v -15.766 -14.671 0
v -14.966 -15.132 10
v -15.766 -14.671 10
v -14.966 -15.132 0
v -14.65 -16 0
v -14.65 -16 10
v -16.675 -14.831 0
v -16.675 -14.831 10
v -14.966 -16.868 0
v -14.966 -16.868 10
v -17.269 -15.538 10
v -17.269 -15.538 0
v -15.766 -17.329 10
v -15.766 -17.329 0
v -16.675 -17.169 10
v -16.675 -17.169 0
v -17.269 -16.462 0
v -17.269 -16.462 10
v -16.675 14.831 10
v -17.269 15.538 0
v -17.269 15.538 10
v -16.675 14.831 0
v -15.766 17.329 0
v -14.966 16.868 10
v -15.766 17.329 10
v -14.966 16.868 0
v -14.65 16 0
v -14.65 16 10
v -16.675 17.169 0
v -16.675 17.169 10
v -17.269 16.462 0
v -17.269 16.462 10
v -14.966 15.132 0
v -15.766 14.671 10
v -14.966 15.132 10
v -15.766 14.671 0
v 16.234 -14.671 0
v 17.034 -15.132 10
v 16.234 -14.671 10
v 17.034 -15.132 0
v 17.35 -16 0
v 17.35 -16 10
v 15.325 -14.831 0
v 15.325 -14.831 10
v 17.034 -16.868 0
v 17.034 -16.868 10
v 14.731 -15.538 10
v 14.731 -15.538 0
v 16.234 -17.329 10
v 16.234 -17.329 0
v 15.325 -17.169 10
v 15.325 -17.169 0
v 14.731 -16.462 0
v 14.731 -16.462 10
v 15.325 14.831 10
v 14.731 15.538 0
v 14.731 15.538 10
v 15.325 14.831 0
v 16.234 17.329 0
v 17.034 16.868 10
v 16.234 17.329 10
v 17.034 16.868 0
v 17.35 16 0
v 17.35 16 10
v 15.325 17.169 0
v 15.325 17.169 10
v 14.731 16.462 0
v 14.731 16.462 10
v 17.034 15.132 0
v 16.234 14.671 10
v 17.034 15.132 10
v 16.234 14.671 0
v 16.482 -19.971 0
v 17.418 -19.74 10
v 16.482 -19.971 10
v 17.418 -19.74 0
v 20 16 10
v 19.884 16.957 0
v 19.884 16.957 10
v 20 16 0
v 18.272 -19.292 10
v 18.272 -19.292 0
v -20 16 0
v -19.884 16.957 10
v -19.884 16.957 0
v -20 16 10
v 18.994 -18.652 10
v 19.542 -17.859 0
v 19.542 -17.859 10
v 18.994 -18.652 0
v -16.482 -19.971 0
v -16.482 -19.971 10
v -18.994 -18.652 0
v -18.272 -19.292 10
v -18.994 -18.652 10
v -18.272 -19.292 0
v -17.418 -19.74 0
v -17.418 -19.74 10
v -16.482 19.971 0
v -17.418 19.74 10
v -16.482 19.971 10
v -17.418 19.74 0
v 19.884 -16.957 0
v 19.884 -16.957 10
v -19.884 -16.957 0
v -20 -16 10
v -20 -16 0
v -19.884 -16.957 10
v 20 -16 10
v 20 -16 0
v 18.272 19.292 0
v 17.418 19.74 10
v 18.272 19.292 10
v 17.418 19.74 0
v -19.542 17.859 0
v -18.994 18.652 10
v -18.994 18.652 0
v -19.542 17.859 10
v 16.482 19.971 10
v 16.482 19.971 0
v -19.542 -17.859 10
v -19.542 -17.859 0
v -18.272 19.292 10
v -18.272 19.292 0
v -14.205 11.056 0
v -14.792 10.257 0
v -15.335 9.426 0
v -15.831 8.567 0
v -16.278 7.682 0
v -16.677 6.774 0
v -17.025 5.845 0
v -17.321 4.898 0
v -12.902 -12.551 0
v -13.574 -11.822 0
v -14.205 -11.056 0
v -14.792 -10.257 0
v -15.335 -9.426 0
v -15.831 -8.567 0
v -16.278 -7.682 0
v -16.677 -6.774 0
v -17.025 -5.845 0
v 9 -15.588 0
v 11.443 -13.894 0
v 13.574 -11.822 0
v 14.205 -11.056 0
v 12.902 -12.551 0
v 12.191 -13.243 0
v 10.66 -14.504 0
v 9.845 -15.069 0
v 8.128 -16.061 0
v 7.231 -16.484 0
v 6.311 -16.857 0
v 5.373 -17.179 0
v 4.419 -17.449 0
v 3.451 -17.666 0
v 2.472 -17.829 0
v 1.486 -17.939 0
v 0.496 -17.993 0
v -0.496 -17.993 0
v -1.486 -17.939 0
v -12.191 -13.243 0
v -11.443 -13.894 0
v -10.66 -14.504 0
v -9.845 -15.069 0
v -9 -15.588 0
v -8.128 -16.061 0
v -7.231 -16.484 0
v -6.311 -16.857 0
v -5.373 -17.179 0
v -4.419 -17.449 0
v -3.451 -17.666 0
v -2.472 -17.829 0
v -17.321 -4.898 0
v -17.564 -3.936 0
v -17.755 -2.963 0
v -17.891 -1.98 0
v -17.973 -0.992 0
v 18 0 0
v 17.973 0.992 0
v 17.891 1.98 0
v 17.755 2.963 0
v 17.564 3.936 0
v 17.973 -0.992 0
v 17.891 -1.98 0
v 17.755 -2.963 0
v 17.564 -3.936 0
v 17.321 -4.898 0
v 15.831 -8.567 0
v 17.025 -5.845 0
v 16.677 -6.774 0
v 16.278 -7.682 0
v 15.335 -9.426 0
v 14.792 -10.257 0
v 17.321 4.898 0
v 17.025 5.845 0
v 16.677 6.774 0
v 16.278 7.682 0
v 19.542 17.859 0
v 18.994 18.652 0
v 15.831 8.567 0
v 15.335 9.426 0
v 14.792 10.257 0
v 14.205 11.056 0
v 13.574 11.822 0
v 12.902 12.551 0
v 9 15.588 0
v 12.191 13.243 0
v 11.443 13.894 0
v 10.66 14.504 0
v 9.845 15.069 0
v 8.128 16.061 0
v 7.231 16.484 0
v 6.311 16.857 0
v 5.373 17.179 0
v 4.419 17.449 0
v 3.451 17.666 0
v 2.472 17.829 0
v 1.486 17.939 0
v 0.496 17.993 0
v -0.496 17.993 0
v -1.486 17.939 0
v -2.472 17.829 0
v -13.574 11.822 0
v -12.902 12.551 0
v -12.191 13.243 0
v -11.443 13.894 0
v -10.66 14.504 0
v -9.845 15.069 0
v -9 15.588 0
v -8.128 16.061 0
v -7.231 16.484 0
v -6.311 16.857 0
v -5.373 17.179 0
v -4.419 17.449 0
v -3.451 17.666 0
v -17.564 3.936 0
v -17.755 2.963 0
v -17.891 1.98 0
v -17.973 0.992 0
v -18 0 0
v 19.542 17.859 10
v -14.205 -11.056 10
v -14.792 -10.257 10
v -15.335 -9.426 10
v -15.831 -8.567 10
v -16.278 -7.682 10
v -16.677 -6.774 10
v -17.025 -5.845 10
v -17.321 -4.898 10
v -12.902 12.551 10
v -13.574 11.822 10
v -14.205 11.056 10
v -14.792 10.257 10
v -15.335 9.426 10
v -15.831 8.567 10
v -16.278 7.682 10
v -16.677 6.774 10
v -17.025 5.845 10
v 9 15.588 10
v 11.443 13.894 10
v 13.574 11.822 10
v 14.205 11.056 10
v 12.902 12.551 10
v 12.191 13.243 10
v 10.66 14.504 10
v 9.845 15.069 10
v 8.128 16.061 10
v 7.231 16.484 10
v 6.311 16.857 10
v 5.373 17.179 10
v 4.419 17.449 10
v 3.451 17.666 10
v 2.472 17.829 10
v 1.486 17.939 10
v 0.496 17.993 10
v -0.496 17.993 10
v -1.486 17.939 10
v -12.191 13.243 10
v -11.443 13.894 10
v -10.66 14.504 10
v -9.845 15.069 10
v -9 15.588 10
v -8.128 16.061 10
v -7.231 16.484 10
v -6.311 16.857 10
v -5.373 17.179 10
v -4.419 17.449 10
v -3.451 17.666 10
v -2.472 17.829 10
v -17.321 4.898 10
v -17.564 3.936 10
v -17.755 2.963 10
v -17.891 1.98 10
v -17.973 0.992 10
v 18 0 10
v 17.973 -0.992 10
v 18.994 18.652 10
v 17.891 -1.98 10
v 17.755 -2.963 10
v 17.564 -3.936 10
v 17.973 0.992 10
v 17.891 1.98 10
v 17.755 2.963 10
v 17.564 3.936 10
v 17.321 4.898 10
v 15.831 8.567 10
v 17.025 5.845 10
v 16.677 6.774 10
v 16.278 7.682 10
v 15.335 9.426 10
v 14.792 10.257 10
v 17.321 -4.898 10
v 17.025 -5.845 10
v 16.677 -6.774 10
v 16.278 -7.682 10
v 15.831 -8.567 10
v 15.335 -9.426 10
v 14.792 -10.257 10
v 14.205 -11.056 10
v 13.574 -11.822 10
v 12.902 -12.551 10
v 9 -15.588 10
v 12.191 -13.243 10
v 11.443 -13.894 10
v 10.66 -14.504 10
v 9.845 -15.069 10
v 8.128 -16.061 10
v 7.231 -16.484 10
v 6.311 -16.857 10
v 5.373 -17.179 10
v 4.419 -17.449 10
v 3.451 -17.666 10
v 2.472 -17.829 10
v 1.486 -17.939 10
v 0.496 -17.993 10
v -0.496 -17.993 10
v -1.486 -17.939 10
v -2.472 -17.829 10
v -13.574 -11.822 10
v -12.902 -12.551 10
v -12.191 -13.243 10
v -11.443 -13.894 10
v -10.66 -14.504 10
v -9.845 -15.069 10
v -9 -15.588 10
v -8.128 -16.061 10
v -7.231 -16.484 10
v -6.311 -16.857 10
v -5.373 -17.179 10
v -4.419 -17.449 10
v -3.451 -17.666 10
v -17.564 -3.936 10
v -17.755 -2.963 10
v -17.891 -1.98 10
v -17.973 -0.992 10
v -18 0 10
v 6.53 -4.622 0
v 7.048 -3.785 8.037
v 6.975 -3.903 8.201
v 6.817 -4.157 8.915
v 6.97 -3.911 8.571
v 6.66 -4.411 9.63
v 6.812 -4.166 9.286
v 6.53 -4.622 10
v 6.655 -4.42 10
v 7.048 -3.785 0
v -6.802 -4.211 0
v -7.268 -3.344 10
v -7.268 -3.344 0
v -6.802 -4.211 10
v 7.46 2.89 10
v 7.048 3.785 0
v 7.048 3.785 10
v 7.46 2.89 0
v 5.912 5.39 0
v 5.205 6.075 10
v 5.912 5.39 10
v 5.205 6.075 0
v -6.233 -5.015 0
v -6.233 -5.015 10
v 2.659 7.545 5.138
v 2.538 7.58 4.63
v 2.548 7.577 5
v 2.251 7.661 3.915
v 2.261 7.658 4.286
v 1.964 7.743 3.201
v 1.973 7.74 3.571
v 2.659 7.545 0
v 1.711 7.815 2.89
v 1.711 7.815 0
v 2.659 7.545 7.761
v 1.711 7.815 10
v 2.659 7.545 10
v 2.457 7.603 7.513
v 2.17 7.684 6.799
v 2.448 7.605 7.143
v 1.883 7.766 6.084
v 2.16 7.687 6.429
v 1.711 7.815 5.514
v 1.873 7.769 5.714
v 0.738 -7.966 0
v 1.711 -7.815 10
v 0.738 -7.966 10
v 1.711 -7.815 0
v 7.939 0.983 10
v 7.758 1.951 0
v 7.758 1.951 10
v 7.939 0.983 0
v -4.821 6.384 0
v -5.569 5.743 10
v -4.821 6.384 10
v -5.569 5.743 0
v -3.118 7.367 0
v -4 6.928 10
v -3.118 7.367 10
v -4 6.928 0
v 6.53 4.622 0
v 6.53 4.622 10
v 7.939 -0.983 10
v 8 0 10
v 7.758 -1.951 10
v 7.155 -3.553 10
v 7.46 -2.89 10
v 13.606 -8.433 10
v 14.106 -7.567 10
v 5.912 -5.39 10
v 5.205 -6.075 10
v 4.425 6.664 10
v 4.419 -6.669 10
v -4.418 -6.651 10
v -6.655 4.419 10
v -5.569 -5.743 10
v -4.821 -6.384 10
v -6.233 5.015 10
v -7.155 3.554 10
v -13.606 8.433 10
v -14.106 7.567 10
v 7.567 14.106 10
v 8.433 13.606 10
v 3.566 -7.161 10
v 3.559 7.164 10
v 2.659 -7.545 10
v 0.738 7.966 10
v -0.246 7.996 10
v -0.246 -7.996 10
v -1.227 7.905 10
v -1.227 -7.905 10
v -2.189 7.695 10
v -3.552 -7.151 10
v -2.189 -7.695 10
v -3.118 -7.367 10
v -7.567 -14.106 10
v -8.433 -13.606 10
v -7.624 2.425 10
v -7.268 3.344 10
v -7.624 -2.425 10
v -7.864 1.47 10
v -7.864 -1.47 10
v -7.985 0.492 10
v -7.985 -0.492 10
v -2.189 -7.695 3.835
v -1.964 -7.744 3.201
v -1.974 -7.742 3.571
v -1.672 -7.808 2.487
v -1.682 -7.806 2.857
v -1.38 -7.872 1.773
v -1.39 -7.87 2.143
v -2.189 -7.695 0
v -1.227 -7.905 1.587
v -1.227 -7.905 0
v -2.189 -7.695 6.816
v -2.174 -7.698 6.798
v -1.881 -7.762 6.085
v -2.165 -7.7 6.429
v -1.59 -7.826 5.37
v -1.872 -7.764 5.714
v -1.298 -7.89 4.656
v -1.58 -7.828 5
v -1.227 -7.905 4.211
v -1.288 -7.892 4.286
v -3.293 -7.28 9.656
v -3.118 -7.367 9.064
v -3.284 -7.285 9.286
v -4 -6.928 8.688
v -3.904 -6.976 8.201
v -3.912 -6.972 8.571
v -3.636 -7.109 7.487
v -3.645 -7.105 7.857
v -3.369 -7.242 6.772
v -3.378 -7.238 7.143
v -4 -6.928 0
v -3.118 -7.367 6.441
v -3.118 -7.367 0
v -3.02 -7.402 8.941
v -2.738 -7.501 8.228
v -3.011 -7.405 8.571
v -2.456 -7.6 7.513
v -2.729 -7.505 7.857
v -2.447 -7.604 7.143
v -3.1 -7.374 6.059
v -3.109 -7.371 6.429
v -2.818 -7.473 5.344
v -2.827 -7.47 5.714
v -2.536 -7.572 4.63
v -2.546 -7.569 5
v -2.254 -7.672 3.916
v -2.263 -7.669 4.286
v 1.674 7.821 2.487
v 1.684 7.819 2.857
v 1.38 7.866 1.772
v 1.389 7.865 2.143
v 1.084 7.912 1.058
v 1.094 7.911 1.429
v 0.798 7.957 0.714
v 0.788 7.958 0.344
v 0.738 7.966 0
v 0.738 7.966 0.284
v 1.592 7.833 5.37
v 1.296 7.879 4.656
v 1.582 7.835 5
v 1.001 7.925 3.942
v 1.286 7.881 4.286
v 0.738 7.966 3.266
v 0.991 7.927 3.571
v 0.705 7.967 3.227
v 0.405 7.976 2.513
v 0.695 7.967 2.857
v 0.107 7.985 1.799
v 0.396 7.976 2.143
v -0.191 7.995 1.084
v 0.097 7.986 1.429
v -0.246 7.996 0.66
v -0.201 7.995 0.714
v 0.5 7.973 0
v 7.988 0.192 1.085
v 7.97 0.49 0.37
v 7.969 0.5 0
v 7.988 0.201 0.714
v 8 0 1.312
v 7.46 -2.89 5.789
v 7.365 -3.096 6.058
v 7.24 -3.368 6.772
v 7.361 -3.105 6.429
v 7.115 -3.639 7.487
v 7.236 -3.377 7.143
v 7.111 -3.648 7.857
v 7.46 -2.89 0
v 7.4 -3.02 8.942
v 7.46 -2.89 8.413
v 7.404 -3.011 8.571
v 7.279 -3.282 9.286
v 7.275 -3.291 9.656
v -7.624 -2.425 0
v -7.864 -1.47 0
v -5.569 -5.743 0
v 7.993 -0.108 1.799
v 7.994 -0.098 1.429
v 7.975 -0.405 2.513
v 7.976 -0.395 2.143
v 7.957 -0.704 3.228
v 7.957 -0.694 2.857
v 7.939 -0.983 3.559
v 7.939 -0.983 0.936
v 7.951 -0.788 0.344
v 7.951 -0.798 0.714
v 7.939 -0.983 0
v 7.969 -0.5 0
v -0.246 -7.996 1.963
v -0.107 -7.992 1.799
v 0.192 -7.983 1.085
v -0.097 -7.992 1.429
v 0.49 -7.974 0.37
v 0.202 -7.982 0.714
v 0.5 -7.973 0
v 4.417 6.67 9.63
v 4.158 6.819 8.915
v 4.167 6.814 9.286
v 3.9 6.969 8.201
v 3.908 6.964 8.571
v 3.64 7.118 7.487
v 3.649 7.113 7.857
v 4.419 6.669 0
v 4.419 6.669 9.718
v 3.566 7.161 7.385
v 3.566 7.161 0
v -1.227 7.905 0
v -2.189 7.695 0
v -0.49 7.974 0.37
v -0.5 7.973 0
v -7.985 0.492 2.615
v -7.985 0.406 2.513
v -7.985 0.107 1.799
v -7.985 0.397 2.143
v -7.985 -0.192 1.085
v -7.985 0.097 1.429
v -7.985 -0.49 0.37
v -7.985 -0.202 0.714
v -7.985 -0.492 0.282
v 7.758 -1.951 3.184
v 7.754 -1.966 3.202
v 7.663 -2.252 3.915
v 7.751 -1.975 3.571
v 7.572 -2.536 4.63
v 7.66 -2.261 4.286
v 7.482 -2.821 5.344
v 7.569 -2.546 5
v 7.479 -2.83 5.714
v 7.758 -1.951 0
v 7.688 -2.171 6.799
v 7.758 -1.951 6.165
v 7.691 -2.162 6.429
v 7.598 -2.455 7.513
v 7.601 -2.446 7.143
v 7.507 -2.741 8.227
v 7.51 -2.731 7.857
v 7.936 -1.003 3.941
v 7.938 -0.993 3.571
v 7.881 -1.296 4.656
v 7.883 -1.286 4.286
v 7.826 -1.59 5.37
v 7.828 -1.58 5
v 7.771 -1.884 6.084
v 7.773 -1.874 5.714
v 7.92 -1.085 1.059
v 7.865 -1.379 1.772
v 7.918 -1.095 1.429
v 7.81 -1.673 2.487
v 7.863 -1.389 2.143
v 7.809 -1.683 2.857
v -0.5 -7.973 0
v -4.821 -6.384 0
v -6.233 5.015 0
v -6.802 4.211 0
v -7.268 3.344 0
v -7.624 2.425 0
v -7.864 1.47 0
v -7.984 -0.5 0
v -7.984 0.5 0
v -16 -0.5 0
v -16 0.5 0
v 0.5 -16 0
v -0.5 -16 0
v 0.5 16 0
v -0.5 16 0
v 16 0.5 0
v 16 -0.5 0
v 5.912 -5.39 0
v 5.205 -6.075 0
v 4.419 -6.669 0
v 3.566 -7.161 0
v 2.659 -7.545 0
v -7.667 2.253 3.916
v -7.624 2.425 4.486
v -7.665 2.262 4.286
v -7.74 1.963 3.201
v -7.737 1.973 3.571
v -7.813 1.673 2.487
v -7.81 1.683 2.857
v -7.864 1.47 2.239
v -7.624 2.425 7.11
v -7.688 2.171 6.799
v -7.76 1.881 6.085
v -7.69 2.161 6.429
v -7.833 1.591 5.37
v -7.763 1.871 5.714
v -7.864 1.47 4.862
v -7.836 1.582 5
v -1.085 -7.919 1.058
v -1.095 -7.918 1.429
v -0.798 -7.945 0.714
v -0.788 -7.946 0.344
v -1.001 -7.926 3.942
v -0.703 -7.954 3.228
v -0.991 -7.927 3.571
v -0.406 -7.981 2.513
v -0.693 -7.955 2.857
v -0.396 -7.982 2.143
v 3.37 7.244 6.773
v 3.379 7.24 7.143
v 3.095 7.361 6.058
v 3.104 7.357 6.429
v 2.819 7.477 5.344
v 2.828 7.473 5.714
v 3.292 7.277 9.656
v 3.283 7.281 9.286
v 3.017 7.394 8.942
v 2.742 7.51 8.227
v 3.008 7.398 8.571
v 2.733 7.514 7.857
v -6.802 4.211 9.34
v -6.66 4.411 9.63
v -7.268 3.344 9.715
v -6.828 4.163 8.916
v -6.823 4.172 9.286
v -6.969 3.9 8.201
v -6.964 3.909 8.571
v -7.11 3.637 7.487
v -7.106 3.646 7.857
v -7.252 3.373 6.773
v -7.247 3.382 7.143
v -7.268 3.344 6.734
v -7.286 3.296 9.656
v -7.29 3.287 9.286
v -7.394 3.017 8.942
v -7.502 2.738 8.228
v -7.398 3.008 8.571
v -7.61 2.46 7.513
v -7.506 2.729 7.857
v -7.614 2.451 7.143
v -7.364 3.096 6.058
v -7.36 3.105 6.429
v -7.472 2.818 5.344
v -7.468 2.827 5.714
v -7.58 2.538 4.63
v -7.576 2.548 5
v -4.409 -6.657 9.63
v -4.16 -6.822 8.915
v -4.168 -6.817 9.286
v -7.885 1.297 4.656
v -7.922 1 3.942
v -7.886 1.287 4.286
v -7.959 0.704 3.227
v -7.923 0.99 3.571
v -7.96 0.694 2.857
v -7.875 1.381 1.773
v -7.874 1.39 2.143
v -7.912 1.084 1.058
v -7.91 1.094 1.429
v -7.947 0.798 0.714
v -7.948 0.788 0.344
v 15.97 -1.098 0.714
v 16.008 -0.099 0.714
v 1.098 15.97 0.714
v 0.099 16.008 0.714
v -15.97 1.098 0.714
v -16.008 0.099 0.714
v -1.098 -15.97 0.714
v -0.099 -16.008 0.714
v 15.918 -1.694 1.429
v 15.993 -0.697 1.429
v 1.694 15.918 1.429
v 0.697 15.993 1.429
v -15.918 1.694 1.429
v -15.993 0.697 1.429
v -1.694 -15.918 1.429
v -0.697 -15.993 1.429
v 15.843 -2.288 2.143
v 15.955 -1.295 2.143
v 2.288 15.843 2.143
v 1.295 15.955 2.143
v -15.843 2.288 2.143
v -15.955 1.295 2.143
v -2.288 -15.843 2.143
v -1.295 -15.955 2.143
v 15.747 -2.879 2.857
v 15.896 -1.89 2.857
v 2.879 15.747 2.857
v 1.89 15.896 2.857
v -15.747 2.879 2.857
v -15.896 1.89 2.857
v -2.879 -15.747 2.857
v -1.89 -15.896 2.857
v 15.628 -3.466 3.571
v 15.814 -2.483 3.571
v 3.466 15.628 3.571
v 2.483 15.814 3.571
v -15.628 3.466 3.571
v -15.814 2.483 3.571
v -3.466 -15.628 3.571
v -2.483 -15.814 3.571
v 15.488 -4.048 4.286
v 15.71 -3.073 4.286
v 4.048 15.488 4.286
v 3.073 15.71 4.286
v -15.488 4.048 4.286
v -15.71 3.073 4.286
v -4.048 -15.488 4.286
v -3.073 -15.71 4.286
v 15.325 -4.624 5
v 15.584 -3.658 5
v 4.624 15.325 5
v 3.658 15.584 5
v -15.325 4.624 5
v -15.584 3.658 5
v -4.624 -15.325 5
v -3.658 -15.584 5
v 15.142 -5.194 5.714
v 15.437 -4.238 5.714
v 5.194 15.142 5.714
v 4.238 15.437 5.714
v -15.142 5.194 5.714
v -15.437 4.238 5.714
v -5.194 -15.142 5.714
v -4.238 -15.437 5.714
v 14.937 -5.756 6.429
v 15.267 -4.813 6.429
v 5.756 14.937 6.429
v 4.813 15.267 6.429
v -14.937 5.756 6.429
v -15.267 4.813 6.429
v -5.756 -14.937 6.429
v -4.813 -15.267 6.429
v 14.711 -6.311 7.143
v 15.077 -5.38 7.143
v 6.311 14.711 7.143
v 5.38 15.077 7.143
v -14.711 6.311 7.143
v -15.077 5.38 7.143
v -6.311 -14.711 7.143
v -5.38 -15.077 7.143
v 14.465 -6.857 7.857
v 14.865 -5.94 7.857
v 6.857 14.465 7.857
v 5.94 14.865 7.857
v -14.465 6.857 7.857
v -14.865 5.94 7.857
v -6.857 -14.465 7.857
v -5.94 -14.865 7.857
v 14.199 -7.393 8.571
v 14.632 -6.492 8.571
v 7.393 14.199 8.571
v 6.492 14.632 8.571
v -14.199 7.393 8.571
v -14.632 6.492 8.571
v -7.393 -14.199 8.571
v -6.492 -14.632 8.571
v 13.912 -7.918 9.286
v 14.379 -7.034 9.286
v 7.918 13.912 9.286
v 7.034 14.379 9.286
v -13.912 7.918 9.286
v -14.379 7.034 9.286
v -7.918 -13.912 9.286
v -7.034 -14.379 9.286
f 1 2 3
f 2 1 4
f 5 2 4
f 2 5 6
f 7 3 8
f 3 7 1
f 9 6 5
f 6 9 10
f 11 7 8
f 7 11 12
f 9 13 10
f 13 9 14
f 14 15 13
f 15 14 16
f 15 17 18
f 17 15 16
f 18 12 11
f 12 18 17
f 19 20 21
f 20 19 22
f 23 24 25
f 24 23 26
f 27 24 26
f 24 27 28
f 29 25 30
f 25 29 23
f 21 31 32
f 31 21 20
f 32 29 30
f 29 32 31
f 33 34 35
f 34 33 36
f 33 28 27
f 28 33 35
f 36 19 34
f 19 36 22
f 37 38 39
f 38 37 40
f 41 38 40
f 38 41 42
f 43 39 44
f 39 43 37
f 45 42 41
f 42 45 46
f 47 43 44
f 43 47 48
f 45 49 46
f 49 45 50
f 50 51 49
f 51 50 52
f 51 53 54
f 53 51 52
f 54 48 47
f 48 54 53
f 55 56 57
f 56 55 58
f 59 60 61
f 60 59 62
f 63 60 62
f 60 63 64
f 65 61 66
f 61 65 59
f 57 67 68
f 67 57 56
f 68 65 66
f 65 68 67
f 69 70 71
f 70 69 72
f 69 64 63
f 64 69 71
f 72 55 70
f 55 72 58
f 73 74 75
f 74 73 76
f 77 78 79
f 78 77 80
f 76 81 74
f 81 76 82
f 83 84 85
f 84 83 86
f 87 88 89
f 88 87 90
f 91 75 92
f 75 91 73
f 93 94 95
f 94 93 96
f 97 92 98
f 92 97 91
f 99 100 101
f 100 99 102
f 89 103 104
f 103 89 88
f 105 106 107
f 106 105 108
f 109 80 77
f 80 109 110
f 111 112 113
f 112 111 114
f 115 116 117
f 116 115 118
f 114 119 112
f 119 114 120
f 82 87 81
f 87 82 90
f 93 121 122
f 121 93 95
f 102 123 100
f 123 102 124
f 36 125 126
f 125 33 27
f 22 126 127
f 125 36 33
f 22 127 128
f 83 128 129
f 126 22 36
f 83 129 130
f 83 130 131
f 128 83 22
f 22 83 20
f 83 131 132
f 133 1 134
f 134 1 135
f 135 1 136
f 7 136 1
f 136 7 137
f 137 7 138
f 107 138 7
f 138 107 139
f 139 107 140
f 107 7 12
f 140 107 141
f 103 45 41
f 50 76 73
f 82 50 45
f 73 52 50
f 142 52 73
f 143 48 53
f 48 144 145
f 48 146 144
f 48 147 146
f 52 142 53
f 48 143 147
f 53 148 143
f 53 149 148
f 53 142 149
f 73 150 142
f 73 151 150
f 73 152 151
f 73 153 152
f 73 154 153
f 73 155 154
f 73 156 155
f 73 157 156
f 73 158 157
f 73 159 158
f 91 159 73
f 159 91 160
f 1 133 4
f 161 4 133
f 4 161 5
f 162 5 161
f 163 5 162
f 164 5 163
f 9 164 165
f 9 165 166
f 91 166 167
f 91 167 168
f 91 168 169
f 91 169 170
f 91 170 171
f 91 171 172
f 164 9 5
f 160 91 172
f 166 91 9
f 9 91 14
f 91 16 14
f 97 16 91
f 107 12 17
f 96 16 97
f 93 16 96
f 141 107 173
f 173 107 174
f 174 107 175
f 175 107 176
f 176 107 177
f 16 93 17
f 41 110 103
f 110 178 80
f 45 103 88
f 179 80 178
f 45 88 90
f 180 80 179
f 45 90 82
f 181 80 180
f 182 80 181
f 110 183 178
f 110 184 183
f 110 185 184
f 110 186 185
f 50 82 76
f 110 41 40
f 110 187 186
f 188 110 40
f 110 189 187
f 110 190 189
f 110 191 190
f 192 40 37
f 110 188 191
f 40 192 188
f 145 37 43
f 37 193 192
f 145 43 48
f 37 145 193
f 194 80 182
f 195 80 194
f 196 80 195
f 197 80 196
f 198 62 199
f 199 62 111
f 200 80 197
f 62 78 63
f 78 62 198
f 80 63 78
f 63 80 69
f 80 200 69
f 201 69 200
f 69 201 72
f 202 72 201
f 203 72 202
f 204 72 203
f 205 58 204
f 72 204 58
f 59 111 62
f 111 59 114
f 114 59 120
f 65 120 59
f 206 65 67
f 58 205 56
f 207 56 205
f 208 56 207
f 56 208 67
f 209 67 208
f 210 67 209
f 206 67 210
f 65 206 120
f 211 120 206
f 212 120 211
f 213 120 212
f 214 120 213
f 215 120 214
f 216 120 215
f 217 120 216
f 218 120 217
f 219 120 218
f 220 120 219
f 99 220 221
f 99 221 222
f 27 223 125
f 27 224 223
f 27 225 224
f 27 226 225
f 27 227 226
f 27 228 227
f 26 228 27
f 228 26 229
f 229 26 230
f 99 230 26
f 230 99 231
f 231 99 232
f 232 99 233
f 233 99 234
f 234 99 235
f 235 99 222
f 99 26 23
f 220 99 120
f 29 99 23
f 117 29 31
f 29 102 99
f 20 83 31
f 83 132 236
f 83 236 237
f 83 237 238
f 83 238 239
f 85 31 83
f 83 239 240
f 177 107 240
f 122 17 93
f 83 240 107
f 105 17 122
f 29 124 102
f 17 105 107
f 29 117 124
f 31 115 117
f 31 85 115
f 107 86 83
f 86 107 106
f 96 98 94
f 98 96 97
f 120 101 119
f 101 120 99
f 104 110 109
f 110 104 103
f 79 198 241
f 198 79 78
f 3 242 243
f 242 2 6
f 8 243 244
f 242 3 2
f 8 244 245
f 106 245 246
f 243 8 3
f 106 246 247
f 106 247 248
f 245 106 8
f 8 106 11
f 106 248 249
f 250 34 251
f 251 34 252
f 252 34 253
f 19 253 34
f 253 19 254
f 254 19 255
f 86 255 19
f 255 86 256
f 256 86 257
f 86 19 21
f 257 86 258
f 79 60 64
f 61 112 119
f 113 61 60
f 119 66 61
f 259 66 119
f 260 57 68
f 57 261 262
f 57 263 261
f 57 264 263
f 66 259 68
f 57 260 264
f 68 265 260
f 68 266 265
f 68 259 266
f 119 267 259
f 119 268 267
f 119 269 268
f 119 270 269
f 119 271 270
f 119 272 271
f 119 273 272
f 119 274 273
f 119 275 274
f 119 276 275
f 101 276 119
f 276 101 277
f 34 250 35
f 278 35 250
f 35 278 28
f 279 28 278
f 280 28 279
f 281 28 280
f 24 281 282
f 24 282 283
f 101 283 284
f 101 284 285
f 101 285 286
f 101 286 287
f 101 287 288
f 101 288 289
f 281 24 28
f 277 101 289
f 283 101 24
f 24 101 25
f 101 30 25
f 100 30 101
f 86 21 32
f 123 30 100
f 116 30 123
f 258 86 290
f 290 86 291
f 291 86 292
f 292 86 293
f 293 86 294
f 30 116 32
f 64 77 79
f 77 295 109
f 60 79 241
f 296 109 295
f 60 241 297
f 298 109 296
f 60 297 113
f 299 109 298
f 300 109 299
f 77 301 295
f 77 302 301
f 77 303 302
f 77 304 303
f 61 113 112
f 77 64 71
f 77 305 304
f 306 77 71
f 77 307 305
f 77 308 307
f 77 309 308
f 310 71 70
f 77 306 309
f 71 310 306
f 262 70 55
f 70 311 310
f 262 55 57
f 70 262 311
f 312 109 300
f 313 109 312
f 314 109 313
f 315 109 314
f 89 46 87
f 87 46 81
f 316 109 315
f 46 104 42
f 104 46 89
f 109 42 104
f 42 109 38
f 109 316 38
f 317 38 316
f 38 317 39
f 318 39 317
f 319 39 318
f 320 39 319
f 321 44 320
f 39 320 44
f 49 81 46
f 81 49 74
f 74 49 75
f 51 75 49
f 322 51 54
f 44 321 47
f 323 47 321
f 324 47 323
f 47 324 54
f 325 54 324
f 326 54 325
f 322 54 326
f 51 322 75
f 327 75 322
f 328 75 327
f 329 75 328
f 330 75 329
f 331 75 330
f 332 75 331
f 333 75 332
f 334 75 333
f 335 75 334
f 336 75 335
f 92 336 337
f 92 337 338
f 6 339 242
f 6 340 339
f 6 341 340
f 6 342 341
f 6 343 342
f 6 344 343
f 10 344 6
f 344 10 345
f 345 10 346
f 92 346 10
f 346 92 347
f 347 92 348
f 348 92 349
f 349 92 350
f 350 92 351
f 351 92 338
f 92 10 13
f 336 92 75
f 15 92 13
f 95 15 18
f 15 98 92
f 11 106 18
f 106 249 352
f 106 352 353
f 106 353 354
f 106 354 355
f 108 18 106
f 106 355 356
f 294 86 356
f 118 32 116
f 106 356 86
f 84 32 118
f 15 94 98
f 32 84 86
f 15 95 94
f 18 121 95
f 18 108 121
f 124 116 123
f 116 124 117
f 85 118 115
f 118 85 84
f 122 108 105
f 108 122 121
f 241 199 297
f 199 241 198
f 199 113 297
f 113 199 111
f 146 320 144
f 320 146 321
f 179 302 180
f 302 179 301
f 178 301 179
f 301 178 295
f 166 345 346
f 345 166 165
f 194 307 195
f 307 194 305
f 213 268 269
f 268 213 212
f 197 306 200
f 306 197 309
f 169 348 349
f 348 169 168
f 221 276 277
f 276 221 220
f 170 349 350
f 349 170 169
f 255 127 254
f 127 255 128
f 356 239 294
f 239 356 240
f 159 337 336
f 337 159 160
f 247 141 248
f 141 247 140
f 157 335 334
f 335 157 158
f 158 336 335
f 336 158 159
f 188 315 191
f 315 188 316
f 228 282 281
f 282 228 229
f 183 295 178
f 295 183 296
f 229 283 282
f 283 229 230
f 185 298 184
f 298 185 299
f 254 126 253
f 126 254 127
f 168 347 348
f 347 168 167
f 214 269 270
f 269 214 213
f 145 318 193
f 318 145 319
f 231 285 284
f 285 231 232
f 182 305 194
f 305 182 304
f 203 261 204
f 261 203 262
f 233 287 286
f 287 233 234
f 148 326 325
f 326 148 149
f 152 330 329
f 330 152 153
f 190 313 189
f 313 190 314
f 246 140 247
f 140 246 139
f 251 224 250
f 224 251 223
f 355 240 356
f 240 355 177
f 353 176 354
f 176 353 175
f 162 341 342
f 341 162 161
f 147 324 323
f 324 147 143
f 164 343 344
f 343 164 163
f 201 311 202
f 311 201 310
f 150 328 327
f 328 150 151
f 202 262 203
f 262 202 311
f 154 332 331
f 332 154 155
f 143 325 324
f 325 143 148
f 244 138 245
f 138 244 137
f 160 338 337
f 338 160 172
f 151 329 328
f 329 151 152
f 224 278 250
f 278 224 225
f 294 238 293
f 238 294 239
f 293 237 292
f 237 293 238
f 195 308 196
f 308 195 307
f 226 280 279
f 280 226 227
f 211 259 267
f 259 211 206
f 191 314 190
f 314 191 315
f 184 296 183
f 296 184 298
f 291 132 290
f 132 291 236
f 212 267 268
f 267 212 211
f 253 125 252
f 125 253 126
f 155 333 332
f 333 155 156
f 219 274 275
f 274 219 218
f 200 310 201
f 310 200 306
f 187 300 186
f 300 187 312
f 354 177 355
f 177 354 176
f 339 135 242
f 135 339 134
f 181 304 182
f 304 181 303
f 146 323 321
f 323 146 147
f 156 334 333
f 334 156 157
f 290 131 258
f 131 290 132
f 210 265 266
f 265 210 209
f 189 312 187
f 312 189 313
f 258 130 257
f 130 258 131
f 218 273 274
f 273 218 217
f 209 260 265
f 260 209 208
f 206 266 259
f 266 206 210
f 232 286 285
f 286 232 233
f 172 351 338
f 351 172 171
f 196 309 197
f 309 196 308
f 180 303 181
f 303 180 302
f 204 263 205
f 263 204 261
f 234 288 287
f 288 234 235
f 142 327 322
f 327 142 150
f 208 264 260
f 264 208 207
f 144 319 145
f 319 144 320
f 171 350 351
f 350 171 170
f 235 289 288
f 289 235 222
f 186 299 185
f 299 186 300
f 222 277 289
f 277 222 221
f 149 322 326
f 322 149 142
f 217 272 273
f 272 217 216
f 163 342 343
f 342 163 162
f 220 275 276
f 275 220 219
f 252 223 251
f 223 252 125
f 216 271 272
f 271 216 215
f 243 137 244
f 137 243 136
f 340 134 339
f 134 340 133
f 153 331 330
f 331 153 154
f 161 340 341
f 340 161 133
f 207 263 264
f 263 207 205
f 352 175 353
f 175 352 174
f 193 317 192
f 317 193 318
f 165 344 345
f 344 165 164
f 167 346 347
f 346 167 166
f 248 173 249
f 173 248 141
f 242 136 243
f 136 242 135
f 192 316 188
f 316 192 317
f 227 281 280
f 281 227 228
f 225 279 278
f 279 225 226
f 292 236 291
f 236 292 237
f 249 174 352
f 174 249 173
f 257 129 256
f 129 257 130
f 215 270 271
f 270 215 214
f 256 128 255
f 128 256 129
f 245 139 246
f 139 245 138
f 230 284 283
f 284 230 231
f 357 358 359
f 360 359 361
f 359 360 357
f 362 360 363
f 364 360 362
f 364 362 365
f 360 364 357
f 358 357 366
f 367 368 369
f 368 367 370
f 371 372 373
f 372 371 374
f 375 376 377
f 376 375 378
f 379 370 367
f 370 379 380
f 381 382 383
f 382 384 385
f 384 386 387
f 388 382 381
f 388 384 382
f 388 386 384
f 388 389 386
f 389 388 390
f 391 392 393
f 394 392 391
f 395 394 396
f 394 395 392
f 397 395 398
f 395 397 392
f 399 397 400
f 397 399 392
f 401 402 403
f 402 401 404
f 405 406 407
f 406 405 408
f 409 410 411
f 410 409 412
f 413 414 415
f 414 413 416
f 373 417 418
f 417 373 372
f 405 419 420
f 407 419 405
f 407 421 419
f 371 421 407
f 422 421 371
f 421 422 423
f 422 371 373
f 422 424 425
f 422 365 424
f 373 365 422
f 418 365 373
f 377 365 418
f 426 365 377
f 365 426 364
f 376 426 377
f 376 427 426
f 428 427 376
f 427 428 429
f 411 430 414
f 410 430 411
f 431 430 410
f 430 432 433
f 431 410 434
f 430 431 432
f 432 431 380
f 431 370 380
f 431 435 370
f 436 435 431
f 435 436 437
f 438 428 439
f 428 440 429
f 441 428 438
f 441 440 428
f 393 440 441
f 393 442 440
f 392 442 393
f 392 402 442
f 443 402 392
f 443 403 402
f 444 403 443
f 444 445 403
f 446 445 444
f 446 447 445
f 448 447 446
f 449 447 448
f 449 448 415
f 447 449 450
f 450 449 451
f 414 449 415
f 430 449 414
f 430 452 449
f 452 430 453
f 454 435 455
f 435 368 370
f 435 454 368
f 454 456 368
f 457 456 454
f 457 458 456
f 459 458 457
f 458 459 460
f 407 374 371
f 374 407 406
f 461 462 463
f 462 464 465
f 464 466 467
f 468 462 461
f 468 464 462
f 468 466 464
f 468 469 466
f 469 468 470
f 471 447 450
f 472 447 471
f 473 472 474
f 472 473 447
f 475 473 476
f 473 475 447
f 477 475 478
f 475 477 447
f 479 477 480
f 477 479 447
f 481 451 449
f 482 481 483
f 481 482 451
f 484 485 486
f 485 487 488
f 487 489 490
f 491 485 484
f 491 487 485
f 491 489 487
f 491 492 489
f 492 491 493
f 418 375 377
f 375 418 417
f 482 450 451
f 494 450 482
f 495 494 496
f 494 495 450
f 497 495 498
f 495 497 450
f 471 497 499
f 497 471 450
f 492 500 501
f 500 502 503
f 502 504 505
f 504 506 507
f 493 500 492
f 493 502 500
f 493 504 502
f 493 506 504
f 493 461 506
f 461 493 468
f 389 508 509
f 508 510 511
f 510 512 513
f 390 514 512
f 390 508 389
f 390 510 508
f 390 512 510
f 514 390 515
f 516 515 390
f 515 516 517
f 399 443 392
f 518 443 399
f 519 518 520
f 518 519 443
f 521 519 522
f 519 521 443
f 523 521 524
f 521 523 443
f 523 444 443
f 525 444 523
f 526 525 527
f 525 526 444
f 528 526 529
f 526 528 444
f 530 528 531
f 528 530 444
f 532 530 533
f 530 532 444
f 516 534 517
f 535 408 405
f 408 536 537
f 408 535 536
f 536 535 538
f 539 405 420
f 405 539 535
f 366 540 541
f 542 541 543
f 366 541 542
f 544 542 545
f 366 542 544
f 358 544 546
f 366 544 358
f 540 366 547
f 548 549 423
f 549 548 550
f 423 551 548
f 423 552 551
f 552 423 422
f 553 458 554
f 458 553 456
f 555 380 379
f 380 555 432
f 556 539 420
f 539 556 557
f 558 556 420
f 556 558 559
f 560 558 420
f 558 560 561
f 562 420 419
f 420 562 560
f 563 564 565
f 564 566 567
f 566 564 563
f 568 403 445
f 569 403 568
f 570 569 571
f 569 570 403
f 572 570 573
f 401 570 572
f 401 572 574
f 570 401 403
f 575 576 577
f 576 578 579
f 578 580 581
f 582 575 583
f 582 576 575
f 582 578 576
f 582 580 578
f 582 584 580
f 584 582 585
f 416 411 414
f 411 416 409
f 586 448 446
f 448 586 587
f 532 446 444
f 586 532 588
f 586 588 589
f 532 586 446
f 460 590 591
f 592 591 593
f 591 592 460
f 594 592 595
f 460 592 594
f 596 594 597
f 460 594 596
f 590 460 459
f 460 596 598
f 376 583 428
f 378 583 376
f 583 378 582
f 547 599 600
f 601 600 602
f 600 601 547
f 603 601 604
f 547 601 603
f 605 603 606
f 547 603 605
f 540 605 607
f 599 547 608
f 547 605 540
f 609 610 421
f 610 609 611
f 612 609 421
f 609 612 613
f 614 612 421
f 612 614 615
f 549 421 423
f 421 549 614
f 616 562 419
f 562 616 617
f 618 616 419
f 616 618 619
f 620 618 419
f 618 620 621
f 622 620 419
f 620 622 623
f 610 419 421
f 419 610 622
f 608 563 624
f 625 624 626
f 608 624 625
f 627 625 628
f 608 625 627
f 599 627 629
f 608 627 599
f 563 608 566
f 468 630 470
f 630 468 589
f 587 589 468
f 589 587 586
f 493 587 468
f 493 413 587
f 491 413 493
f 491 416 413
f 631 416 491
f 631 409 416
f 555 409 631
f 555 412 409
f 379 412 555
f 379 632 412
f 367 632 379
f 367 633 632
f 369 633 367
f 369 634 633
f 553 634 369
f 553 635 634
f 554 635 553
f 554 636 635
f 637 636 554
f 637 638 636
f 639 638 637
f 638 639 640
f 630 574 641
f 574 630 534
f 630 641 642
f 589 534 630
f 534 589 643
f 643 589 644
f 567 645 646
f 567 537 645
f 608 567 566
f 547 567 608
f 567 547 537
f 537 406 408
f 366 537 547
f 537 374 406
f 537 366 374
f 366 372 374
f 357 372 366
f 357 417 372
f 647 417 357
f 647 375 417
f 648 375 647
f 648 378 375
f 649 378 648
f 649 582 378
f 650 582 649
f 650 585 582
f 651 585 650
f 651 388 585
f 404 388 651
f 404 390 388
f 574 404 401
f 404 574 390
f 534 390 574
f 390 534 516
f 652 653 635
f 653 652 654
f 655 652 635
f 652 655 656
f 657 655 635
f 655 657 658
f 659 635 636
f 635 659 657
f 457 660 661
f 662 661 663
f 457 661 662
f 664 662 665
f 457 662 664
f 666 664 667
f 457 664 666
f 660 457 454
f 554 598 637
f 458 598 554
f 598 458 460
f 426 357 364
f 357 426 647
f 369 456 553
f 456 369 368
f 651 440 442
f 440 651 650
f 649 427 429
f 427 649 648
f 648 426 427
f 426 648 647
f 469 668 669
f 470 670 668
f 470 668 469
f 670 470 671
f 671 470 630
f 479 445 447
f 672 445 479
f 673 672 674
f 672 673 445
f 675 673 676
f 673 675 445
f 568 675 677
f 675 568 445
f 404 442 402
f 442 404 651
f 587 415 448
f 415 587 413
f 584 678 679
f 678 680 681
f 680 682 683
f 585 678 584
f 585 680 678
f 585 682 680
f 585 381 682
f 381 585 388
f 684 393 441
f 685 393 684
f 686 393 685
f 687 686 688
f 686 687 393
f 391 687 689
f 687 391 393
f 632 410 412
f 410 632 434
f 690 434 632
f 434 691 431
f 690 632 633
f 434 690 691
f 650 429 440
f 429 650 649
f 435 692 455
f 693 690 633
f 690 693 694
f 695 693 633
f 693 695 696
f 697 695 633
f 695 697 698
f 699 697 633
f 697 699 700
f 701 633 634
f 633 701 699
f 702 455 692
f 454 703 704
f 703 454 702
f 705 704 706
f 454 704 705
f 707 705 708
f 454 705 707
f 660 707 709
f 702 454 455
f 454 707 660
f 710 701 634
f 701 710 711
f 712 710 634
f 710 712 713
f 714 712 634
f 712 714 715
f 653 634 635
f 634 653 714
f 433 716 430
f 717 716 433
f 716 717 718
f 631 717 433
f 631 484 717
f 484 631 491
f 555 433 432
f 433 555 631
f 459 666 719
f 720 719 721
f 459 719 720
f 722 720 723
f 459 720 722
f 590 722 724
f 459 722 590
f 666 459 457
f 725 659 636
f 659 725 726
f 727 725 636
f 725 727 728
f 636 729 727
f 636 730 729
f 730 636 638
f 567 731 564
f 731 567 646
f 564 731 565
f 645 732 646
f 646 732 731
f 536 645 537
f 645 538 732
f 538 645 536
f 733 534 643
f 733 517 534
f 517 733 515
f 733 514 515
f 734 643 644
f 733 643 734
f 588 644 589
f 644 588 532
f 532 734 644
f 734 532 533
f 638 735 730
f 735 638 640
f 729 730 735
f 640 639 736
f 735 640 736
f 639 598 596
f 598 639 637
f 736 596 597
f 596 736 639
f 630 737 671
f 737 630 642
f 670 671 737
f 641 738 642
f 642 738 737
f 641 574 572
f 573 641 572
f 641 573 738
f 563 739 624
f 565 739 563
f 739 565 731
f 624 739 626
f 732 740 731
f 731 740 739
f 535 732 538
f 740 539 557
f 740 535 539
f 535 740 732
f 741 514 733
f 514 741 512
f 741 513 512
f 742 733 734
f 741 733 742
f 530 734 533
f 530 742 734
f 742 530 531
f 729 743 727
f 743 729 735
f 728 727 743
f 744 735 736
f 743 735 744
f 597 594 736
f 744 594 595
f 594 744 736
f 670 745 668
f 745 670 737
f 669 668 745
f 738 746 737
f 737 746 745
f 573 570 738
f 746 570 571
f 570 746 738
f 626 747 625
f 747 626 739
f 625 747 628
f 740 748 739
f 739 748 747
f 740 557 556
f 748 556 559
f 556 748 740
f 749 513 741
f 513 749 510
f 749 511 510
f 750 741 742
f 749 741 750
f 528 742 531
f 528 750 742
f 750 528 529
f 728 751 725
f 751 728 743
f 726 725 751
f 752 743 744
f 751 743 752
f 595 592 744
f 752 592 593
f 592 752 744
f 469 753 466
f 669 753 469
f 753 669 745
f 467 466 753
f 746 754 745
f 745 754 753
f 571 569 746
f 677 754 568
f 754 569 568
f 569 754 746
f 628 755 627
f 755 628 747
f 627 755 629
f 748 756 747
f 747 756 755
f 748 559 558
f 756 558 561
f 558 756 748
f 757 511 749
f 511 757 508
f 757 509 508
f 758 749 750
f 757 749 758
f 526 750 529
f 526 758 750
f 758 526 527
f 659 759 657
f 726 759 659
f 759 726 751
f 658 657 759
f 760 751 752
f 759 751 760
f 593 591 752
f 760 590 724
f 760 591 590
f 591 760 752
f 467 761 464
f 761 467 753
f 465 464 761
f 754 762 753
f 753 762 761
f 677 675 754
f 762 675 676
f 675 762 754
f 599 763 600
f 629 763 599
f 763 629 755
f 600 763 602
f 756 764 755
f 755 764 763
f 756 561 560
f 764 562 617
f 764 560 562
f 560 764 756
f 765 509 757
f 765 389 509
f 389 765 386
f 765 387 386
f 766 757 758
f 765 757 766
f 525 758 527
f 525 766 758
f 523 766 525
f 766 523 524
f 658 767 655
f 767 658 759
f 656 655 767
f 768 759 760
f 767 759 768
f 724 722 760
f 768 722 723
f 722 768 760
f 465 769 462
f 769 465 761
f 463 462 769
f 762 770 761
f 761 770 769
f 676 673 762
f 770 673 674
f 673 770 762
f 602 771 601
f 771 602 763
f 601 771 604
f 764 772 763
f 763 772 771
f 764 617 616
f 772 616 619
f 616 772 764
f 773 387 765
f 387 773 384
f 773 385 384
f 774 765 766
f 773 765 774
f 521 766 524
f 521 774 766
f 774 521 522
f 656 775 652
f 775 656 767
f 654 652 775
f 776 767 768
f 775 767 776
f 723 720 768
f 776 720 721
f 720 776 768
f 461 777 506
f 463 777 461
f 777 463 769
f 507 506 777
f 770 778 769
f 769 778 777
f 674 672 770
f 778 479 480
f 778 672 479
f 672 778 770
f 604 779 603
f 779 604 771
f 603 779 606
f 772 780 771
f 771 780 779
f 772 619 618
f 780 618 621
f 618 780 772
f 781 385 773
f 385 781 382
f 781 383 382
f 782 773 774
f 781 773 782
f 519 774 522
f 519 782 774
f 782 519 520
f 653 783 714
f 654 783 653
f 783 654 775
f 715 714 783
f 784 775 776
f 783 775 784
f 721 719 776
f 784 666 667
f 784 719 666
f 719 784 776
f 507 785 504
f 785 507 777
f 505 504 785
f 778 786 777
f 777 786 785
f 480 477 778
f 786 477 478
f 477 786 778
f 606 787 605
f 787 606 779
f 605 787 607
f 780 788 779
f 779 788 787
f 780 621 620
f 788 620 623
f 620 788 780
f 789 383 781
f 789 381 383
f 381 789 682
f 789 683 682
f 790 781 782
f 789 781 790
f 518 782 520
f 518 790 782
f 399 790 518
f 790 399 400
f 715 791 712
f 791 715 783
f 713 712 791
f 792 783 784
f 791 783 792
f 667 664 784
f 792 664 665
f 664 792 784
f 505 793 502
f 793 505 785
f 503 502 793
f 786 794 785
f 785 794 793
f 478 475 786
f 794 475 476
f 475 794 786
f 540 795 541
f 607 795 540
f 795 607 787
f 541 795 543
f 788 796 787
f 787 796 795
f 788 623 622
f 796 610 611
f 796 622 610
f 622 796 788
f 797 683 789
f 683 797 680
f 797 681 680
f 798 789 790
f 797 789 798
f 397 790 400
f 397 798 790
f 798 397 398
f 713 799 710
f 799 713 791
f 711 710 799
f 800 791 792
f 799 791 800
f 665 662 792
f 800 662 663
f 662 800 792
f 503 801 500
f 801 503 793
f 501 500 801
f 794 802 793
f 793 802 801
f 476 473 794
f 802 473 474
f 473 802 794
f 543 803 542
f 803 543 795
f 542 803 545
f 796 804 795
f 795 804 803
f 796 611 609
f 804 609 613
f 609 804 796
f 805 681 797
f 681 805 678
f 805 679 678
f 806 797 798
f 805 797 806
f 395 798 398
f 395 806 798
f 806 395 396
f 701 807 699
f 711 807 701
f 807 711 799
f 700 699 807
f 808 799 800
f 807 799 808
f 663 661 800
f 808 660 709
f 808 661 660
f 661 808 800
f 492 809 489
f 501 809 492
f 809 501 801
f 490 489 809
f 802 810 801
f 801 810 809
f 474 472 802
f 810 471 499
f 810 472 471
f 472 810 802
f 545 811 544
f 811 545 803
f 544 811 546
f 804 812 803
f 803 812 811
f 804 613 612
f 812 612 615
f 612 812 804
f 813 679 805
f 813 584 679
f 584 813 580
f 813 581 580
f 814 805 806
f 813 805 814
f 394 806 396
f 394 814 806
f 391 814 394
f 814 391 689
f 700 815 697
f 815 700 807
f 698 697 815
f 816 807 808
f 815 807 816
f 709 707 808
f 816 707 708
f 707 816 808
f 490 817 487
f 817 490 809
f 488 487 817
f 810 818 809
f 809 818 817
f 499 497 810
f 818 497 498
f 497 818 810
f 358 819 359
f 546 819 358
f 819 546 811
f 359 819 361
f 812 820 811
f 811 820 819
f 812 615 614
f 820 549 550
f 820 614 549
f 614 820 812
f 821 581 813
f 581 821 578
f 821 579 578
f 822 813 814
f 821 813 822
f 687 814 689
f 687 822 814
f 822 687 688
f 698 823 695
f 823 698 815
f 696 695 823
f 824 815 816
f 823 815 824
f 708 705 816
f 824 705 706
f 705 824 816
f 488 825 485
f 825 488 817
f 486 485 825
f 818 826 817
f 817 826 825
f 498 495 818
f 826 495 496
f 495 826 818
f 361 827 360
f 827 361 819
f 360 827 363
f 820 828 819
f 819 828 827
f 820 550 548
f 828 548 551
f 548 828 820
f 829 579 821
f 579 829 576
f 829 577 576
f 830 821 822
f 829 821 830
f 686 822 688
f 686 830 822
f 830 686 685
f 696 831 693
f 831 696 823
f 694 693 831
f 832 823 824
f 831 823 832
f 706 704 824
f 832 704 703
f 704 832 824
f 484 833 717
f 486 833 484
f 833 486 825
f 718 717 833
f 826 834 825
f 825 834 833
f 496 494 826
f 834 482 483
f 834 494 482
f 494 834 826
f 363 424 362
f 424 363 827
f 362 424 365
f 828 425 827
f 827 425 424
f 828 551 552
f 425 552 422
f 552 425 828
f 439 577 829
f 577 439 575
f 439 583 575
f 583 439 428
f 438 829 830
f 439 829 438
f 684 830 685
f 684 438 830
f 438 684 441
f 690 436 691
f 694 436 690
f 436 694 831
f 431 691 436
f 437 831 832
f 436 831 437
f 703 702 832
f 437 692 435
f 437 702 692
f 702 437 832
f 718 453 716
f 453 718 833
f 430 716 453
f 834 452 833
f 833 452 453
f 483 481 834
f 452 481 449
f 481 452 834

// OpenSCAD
// file: ../config.scad
/*
 * config
 *
 * Copyright 2013 <b@Zi.iS>
 * License CC BY 3.0
 */

$fa = 1;
$fs = 1;
preview = 1;

// preview colors
color_steal = [.8,.8,.8];
color_wood = [.3,.3,0];
color_print = [0,.8,0];

// metric bolt sizes
function m_hole(size) = size*1.1/2;
function m_pilot(size) = size*.9/2;

mounting_bolt = 3;

// slightly move and slightly elongate objects in preview to overcome scad rounding errors
module e() {
	if(preview==1) {
		translate([
			0,
			0,
			-.1
		]) {
			scale([
				1,
				1,
				1.1
			]) {
				child();
			}
		}
	} else {
		child();
	}
}

module m_washer(
	size = 3
) {
	color(color_steal) {
		difference() {
			cylinder(
				r = size/2*2,
				h = size*.2
			);
			e() cylinder(
				r = size/2,
				h = size*.2
			);
		}
	}
	translate([
		0,
		0,
		size*.2
	]) {
		child();
	}
}

module m_nut(
	size = 3
) {
	color(color_steal) {
		difference() {
			cylinder(
				r = size*1.8/2,
				h = size*.8,
				$fn = 6
			);
		}
	}
	translate([
		0,
		0,
		size*.8
	]) {
		child();
	}
}

module m_nylock(
	size = 3
) {
	color(color_steal) {
		difference() {
			cylinder(
				r = size*1.8/2,
				h = size,
				$fn = 6
			);
		}
	}
	translate([
		0,
		0,
		size
	]) {
		child();
	}
}

module screw(
	r = 1,
	h = 1,
	pitch = 5,
) {
	linear_extrude(
		height = h,
		twist = -h/pitch*360
	) {
		translate([pitch/5,0,0]) { //H=.2*p works better in plastic then ISO's H=.866*p
			circle(
				r=r 
			);
		}
	}
}

fan40 = [
	40,			//width/length
	10,			//height
	32,			//bolt pitch
	3,			//bolt
];

lm8uu = [
	15.2/2,	//outside
	8/2,	//inside
	26,		//length
];
// main file
/*
 * fan
 *
 * Copyright 2013 <b@Zi.iS>
 * License CC BY 3.0
 */

include <../config.scad>;

fan();

module fan(
	size = fan40
) {
	echo("Fan ", size[0], "mm");
	color([.3,.3,.3]) {
		difference() {
			hull() {
				for(x=[0:1]) {
					for(y=[0:1]) {
						translate([
							-size[2]/2 + size[2] * x,
							-size[2]/2 + size[2] * y,
							0
						]) {
							cylinder(
								r = (size[0] - size[2])/2,
								h = size[1]
							);
						}
					}
				}
			}
			for(x=[0:1]) {
				for(y=[0:1]) {
					translate([
						-size[2]/2 + size[2] * x,
						-size[2]/2 + size[2] * y,
						0
					]) {
						e() cylinder(
							r = m_pilot(size[3]),
							h = size[1]
						);
					}
				}
			}
			e() cylinder(
				r = size[0]/2*.9,
				h = size[1]
			);
		}
	}

	color([.7,.7,.7]) {
		cylinder(
			r = size[0]/2*.4,
			h = size[1]
		);
		linear_extrude(
			twist=30,
			height =  size[1]
		) {
			square(center=true, [size[0]*.8,1]);
			square(center=true, [1, size[0]*.8]);
		}
	}
}
